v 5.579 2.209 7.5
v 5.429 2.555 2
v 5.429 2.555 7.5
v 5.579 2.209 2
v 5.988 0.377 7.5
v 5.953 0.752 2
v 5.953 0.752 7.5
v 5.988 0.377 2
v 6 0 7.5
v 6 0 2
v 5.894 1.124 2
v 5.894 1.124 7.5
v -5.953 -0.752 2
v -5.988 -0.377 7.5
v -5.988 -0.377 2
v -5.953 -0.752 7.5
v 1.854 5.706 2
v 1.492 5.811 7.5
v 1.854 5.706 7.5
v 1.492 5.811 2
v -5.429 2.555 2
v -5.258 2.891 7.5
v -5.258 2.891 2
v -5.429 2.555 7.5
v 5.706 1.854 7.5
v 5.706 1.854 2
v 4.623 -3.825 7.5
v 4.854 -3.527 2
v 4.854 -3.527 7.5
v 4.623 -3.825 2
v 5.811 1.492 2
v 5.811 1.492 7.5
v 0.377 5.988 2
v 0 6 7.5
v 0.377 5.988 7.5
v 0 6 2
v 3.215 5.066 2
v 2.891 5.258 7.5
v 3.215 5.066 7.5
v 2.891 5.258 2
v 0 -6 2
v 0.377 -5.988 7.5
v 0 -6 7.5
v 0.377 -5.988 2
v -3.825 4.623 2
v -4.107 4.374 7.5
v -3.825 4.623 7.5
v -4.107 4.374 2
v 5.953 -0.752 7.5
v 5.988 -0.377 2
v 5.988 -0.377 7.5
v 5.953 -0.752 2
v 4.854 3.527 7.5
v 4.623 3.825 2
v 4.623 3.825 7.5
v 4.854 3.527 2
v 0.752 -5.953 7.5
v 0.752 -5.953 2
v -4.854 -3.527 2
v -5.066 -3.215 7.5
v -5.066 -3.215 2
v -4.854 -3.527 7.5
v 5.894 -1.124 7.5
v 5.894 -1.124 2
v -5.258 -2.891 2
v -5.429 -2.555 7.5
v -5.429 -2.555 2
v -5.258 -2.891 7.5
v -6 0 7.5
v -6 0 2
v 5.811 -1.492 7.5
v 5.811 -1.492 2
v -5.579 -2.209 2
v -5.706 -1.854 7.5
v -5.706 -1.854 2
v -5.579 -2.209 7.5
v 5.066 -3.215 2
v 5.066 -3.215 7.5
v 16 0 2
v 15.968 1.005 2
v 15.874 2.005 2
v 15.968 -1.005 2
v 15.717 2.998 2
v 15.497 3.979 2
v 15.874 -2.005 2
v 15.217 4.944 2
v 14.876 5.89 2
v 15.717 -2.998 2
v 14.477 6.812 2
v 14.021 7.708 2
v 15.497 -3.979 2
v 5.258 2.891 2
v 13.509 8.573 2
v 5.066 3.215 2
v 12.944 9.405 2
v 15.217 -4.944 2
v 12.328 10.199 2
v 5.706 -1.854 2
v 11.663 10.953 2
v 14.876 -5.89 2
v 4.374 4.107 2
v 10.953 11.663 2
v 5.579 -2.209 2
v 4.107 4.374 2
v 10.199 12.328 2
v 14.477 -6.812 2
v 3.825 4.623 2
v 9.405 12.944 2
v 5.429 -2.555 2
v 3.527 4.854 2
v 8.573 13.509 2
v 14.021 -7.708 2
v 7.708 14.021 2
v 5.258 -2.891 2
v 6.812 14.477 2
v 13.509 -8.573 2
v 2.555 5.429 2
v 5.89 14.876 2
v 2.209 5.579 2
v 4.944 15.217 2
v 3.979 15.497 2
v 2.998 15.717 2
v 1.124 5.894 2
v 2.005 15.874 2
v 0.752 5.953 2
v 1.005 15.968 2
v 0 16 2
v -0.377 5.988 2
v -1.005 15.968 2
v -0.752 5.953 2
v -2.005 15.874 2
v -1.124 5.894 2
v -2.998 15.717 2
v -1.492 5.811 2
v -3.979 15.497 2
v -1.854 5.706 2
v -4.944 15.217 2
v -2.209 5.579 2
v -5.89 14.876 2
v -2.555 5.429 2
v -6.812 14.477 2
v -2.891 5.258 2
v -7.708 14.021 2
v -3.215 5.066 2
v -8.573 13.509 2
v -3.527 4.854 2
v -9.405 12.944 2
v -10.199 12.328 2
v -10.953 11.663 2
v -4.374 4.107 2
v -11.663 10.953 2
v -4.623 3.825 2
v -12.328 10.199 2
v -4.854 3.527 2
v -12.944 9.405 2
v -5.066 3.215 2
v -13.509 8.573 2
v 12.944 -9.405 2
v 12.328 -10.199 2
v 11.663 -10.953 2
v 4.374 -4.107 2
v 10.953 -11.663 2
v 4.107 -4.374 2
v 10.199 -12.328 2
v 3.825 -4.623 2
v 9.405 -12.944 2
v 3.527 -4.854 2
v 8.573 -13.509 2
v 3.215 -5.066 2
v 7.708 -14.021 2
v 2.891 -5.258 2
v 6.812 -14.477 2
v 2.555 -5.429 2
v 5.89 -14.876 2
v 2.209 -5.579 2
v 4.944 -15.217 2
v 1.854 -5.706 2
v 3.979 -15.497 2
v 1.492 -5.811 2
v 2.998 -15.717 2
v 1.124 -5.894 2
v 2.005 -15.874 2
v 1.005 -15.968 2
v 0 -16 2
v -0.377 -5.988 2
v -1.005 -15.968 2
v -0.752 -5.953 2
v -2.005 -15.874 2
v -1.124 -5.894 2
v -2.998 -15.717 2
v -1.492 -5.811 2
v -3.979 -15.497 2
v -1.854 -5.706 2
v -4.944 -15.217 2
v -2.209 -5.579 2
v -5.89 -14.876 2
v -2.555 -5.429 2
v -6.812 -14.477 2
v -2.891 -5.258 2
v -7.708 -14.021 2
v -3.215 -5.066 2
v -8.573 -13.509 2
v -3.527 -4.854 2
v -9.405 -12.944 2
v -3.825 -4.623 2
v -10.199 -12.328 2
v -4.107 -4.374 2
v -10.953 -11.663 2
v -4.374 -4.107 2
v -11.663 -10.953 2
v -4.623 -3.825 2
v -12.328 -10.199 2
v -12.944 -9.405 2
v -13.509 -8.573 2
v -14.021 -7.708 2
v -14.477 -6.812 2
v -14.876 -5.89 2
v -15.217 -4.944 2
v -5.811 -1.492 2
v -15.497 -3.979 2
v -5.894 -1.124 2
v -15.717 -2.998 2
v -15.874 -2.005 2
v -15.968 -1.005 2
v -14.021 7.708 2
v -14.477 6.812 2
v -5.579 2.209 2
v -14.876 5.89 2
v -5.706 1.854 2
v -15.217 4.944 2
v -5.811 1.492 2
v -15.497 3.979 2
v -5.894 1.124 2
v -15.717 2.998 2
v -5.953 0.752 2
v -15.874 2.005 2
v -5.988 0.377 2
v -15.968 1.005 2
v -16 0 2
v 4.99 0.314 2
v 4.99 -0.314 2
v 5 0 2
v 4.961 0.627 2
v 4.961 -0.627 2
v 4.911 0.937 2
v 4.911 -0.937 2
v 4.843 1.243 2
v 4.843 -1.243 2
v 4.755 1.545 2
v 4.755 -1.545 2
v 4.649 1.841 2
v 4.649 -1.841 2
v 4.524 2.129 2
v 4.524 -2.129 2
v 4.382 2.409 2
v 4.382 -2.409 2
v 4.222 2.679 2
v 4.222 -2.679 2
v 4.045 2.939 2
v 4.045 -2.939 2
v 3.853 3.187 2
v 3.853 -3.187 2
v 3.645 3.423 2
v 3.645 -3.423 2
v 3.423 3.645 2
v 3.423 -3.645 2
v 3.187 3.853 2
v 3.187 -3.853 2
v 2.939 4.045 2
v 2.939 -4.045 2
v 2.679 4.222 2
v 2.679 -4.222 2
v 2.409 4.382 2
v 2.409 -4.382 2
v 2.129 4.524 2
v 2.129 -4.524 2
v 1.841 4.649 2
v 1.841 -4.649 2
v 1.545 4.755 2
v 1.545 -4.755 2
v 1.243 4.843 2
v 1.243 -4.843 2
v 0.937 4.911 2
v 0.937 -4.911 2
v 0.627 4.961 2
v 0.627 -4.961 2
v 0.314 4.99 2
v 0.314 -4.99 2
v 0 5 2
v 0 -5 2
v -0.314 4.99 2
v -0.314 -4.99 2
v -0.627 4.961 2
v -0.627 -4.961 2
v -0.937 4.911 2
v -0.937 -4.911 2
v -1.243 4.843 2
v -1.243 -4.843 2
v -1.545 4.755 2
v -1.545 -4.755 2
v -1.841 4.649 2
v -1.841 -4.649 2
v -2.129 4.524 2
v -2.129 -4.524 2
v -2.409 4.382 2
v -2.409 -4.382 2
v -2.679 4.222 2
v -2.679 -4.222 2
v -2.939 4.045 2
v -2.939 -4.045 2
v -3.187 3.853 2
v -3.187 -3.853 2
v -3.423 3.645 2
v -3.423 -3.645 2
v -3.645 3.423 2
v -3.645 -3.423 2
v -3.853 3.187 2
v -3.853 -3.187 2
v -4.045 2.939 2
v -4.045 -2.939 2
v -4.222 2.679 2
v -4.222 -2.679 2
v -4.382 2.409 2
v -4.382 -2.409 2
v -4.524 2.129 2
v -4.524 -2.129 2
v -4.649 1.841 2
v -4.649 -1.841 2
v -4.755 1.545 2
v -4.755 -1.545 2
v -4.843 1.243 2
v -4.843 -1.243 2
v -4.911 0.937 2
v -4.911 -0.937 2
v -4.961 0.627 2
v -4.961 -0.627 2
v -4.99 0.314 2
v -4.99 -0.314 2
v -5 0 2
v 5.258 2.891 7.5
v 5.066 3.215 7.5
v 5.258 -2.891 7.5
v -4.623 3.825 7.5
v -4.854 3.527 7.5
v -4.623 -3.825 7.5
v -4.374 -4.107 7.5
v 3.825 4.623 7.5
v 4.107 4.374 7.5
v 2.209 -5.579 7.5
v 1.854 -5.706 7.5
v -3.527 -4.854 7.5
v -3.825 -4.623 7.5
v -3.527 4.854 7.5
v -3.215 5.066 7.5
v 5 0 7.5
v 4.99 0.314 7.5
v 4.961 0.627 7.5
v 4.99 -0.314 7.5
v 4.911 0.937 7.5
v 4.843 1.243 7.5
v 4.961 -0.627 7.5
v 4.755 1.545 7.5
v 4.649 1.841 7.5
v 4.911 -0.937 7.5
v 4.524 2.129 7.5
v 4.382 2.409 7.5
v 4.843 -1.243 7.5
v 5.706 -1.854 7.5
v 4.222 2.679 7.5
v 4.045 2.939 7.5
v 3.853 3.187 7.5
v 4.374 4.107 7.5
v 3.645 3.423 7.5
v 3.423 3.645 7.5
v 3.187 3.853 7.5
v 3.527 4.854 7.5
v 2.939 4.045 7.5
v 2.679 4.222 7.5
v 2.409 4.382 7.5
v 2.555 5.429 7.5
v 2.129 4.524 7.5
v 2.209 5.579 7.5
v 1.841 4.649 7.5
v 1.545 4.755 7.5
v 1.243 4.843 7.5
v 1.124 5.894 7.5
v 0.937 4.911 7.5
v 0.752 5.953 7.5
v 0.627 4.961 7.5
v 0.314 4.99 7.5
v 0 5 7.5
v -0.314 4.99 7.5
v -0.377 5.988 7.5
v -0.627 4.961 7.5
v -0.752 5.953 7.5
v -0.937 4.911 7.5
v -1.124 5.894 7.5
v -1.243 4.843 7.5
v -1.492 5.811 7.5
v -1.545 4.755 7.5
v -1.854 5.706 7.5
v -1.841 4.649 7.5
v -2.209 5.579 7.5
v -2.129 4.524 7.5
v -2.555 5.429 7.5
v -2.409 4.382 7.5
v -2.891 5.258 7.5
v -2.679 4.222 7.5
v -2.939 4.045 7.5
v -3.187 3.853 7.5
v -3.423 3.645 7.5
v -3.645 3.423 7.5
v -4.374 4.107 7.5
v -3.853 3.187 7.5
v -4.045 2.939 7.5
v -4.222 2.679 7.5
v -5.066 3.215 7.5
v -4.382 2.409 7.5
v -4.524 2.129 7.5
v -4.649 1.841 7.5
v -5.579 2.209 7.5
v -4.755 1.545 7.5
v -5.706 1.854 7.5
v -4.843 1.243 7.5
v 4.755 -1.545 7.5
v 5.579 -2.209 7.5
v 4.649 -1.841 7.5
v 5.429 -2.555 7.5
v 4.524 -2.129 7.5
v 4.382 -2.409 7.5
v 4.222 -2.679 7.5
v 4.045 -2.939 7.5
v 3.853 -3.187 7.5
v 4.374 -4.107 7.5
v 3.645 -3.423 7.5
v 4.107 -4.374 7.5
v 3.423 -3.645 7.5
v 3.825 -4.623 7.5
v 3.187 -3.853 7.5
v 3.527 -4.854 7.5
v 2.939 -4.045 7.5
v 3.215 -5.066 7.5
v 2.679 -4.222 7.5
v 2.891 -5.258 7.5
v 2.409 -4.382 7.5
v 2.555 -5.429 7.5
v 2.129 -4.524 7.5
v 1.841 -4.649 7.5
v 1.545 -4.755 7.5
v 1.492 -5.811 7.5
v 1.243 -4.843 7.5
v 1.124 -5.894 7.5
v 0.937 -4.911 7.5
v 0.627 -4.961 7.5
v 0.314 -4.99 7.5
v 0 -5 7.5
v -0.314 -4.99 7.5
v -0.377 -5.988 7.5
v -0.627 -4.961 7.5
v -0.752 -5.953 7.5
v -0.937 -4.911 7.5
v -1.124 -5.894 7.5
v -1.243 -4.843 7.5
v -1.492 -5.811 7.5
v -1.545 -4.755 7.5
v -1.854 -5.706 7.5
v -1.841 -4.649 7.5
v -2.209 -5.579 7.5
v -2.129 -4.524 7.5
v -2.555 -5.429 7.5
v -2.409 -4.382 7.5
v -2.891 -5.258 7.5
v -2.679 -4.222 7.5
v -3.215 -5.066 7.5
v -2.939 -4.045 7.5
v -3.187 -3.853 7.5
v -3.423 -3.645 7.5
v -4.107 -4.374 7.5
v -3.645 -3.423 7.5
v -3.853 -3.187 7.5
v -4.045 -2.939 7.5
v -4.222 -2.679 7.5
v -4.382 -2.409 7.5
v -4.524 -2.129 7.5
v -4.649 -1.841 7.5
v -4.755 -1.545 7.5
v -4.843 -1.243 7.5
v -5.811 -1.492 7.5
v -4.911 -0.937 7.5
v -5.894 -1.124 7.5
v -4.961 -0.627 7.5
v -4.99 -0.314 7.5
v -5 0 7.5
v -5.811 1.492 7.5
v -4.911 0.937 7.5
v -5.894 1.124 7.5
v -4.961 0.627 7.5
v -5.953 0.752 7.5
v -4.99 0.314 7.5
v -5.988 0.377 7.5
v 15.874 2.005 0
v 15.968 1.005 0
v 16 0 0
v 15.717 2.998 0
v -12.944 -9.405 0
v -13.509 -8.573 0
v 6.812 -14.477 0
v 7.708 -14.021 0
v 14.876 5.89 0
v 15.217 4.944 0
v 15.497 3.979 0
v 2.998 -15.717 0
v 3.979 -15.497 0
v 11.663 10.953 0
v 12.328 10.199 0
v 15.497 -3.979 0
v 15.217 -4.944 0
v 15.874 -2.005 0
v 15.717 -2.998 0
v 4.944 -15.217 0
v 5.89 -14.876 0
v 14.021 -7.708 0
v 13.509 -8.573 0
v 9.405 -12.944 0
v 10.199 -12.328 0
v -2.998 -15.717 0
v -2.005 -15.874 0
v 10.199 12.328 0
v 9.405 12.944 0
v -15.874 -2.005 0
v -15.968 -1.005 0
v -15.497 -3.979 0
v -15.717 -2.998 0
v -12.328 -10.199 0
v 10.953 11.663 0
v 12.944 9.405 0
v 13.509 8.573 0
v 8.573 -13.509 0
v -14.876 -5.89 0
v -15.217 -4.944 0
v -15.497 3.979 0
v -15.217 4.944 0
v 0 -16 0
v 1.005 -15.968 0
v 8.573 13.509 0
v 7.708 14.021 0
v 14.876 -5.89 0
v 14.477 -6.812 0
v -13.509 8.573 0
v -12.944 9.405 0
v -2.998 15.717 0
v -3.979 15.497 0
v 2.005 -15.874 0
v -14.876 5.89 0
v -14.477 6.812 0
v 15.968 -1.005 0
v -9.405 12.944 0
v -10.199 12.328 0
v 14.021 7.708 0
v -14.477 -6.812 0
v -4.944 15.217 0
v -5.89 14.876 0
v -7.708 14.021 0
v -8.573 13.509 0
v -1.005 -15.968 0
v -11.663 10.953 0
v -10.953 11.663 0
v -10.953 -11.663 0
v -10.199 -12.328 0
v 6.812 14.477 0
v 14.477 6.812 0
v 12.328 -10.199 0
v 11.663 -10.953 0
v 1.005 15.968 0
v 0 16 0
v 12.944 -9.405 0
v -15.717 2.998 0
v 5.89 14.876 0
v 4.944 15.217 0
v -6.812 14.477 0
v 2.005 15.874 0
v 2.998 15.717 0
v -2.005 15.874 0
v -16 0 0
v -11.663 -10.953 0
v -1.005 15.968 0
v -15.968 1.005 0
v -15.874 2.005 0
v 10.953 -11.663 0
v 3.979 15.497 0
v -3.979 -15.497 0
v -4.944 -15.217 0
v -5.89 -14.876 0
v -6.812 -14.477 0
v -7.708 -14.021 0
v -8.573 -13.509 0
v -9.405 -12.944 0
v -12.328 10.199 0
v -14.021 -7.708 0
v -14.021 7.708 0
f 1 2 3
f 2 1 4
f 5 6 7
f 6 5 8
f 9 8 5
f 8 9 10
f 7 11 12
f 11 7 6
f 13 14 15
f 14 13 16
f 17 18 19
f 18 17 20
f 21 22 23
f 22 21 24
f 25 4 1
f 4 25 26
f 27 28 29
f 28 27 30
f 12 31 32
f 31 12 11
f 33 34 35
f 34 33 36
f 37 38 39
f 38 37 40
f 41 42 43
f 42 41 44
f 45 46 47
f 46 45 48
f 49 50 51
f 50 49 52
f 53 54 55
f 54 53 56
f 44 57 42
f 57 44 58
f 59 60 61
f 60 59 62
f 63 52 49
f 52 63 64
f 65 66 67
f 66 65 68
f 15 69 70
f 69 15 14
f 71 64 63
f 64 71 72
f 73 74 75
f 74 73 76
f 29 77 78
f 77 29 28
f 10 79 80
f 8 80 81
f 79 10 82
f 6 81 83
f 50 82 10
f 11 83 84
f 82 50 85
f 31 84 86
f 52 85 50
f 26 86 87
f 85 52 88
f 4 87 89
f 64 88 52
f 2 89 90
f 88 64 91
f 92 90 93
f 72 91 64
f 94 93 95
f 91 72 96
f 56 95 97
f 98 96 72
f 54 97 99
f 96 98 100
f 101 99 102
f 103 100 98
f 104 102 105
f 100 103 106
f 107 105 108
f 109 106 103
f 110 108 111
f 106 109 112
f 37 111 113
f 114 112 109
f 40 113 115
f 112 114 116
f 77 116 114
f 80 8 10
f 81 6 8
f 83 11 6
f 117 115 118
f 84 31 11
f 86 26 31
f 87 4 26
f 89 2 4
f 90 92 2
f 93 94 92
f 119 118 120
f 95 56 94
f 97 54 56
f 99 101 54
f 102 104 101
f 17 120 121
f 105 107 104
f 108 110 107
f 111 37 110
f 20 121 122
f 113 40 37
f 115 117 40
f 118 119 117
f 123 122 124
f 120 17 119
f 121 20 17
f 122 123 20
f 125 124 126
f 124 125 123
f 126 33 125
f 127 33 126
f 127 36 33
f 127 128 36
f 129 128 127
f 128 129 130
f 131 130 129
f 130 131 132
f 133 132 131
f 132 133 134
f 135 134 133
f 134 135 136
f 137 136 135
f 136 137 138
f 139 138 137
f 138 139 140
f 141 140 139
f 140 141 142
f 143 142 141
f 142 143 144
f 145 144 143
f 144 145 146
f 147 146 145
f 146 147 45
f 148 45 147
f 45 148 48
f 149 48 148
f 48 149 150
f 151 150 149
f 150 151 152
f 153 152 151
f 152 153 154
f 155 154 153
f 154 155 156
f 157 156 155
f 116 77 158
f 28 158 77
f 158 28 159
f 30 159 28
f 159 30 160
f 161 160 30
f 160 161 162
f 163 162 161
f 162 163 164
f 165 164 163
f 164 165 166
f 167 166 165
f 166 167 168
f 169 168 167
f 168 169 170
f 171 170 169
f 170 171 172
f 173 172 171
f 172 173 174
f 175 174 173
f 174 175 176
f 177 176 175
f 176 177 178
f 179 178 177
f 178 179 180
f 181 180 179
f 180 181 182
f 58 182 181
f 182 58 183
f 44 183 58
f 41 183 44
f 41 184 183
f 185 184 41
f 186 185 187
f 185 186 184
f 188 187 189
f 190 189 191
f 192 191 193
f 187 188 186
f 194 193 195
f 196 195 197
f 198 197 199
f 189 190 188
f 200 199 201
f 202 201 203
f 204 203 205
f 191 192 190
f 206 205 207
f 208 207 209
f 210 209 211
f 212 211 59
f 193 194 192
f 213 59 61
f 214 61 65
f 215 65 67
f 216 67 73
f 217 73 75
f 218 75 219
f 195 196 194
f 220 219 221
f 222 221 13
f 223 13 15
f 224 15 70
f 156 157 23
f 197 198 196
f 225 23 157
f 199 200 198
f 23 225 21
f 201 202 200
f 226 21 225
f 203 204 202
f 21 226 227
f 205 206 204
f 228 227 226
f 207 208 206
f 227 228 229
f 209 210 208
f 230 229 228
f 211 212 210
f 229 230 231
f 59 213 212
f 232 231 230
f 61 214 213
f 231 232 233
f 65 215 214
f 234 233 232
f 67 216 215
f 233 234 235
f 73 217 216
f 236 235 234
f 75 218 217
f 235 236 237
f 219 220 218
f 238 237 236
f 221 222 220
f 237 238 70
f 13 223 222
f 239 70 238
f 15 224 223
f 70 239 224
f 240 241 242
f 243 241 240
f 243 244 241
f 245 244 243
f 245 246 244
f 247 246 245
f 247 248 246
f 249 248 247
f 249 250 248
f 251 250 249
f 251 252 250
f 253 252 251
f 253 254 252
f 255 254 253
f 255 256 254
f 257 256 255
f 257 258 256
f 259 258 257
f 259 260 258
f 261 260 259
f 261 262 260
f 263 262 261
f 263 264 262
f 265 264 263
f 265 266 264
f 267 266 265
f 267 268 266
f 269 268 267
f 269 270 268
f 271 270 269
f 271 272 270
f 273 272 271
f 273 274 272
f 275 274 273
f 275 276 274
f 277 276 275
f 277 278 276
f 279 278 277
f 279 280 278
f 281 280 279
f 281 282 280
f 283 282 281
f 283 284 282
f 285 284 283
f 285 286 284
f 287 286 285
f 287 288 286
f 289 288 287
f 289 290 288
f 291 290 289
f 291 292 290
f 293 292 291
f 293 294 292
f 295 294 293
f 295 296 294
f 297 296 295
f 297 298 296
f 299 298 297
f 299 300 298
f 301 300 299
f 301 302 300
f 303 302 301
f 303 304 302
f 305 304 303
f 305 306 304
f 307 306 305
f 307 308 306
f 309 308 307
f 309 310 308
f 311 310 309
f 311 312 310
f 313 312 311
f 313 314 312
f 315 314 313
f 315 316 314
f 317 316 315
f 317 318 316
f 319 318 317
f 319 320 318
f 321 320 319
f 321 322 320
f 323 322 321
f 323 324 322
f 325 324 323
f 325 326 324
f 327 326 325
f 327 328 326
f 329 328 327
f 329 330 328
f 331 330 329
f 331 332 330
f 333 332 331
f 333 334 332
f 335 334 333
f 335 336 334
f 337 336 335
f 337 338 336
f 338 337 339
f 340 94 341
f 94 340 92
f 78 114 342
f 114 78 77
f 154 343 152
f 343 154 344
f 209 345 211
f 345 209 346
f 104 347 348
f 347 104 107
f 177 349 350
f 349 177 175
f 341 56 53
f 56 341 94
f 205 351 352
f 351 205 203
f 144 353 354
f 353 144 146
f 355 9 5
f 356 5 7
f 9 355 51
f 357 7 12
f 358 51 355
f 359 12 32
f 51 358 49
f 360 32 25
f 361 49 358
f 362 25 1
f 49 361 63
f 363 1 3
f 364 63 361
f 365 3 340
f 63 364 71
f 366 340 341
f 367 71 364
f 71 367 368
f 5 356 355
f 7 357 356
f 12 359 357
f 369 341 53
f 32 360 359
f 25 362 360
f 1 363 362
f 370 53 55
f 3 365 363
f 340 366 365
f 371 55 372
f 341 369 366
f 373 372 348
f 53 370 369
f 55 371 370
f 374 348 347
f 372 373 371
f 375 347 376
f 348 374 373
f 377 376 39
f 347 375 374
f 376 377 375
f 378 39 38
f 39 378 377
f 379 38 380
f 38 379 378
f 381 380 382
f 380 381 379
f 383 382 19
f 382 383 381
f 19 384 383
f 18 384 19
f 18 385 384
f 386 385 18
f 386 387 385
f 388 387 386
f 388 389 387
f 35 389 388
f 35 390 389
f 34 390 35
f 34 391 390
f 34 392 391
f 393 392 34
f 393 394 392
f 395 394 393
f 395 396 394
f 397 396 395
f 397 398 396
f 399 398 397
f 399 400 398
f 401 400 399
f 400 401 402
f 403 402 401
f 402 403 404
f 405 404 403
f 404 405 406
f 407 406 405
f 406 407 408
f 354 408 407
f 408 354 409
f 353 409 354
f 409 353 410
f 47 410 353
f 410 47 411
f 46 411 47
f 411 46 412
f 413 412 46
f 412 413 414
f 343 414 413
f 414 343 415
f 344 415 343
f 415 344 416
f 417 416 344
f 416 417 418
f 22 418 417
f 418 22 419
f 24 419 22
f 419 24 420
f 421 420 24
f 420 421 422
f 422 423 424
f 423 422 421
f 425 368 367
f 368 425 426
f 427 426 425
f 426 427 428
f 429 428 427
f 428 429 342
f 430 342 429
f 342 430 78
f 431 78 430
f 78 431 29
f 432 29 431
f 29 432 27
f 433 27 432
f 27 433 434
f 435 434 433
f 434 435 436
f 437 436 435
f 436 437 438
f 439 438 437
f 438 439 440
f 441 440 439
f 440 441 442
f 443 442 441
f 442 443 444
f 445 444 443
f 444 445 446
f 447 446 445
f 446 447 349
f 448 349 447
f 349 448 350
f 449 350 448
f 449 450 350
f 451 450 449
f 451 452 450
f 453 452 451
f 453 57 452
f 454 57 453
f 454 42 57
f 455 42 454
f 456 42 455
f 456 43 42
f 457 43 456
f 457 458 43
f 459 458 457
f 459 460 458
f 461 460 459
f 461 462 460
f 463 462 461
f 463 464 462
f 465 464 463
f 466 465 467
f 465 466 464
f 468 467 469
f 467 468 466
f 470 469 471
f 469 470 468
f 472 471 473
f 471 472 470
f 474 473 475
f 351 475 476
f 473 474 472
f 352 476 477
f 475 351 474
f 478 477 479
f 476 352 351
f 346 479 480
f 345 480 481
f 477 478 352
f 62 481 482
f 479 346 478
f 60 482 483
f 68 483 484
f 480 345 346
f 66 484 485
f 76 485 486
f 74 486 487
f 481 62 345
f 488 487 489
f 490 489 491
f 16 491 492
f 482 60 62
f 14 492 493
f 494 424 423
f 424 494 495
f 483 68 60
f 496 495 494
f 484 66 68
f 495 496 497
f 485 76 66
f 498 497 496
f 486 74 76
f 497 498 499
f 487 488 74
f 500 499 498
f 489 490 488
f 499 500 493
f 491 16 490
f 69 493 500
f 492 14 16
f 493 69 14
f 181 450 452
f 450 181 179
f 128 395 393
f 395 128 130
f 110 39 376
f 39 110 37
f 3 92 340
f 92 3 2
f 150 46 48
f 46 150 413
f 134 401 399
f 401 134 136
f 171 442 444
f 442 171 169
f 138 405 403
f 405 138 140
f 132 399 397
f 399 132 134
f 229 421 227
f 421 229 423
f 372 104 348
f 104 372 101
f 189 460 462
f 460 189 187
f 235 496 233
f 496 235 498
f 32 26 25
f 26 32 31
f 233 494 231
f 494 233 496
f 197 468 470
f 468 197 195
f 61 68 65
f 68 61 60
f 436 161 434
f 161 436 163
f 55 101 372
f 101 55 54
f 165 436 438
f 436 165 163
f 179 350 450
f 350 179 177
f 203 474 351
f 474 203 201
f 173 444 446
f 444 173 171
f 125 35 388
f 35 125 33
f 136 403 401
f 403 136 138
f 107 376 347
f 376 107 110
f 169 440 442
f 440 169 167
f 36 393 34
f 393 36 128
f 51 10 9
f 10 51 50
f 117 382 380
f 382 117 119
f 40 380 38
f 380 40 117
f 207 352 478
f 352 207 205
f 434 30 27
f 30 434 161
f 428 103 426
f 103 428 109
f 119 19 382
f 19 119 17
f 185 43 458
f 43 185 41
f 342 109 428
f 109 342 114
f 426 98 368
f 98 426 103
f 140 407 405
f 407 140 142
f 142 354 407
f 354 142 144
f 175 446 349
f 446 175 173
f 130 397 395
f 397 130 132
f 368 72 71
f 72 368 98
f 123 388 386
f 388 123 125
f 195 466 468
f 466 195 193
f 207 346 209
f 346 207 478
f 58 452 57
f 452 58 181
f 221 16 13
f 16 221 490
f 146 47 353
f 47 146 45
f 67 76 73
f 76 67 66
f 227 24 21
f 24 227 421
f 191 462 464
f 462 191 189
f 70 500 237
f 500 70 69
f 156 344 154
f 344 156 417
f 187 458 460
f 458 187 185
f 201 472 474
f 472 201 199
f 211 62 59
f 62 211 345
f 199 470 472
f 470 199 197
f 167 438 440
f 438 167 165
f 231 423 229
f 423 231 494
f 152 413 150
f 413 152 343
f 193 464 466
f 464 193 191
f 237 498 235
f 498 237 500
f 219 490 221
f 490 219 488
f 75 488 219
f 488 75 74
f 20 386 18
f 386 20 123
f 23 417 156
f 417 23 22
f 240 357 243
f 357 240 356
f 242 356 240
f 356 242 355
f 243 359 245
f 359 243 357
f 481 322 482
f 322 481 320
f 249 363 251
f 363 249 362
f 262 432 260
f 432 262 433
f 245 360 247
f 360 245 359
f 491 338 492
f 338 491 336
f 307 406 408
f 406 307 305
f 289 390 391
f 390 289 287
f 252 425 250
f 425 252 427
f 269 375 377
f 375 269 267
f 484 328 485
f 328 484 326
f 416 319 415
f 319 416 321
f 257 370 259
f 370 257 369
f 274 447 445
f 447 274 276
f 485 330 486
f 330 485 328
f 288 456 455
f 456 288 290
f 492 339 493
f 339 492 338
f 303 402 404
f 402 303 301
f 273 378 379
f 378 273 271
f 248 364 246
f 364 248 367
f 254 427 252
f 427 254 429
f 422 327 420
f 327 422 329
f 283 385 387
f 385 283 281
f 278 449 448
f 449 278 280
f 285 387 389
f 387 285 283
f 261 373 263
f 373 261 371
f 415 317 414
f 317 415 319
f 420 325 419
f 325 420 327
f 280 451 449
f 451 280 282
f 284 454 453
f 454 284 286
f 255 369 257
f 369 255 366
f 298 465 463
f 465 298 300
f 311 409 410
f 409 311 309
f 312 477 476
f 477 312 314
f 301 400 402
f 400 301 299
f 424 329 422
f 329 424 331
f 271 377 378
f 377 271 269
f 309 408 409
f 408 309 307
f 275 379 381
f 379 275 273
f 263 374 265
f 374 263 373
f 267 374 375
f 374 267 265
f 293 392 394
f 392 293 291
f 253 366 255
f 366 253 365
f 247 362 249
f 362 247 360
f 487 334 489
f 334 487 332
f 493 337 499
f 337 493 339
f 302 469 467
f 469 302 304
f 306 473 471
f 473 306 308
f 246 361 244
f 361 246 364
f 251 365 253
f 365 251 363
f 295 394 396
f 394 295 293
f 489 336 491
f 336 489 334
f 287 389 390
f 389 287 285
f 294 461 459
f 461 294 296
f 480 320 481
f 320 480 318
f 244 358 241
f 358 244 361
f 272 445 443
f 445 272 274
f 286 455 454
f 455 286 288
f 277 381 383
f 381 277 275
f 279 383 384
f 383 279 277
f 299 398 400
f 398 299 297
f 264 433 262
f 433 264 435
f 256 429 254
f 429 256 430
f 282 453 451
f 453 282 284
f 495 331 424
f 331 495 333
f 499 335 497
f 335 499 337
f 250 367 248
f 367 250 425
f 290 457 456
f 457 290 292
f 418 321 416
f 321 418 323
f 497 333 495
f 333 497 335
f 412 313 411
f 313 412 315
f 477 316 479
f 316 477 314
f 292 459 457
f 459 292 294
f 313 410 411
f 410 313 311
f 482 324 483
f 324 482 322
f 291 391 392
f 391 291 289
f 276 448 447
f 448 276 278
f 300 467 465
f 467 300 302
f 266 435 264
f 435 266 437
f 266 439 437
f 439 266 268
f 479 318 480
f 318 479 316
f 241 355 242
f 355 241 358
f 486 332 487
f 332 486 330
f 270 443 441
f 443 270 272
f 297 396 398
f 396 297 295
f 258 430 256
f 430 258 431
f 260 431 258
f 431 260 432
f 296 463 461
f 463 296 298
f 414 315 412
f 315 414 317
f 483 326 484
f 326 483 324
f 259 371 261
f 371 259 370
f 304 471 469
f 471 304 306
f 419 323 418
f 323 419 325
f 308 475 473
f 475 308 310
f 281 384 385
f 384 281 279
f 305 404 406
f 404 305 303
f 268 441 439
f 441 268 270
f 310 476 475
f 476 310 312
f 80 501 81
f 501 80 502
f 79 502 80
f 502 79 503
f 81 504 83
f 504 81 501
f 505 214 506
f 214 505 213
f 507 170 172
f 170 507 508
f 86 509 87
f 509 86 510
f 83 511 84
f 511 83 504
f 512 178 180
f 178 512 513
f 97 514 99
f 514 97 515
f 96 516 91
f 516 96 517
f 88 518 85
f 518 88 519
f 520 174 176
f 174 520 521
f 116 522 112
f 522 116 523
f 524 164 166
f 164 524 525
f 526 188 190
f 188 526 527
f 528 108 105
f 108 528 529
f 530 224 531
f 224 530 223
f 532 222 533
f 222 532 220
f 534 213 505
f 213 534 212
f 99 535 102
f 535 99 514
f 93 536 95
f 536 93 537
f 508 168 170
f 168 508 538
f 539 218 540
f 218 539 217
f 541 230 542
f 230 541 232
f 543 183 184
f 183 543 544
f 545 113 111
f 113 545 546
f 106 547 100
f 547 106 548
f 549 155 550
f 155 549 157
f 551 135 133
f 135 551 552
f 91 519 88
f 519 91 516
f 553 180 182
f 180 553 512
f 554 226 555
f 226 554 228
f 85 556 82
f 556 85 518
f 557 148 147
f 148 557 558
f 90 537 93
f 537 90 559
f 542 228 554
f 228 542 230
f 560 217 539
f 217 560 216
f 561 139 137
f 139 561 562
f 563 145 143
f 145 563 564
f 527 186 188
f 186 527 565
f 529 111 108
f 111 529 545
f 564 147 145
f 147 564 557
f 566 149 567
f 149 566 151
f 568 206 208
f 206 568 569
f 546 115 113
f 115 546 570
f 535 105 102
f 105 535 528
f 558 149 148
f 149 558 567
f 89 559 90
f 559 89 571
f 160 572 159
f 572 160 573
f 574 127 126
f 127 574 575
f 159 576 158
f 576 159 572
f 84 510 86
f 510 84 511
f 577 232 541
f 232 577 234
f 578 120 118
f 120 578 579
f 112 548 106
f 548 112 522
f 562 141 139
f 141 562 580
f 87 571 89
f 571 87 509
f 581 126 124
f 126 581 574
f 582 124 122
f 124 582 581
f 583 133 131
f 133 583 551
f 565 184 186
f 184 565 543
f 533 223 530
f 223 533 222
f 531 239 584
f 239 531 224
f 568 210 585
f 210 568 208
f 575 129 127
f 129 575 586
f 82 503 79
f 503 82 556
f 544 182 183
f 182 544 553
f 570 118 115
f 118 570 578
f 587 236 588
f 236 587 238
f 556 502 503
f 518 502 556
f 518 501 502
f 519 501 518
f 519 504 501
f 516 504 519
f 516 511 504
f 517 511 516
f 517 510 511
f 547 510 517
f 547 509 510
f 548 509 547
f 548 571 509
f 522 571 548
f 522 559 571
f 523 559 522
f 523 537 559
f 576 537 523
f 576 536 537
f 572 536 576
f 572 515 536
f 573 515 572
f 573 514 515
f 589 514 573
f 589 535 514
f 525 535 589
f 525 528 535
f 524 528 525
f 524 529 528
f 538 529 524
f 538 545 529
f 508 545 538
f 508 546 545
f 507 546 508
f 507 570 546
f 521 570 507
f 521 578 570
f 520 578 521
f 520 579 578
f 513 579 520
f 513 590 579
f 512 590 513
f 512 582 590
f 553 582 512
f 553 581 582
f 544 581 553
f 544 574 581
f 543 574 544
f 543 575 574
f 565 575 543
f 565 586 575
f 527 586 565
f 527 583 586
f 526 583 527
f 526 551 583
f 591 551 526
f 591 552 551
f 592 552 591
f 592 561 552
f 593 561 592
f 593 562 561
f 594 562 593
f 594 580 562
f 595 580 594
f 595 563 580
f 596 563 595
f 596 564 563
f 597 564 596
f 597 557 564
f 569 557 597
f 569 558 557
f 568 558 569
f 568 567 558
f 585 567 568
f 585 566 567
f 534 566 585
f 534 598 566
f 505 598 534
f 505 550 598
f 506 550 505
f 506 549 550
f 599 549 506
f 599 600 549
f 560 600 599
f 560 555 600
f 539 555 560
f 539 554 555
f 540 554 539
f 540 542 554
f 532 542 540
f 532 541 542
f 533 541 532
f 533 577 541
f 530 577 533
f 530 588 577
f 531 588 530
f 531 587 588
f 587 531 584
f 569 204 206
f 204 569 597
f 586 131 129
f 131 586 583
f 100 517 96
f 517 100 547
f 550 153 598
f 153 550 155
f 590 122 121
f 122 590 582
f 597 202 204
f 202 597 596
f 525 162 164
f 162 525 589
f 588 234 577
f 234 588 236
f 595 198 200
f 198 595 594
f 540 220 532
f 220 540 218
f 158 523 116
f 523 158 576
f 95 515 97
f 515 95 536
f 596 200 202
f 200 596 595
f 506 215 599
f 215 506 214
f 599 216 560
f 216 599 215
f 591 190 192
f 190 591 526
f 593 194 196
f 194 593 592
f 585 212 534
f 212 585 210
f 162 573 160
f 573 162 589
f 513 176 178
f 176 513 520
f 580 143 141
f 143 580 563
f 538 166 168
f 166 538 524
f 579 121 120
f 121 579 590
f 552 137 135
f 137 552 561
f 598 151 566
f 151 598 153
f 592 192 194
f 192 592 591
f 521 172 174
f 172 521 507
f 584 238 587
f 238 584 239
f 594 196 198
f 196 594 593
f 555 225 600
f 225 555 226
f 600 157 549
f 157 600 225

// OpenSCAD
diameter    = 32;
stem_height = 5.5;
top_height  = 2;

cylinder(h=top_height, r=diameter/2, $fn=100);
translate([0,0,top_height]) {
  difference() {
    cylinder(h=stem_height, r=6, $fn=100);
    cylinder(h=stem_height, r=5, $fn=100);
  };
}
